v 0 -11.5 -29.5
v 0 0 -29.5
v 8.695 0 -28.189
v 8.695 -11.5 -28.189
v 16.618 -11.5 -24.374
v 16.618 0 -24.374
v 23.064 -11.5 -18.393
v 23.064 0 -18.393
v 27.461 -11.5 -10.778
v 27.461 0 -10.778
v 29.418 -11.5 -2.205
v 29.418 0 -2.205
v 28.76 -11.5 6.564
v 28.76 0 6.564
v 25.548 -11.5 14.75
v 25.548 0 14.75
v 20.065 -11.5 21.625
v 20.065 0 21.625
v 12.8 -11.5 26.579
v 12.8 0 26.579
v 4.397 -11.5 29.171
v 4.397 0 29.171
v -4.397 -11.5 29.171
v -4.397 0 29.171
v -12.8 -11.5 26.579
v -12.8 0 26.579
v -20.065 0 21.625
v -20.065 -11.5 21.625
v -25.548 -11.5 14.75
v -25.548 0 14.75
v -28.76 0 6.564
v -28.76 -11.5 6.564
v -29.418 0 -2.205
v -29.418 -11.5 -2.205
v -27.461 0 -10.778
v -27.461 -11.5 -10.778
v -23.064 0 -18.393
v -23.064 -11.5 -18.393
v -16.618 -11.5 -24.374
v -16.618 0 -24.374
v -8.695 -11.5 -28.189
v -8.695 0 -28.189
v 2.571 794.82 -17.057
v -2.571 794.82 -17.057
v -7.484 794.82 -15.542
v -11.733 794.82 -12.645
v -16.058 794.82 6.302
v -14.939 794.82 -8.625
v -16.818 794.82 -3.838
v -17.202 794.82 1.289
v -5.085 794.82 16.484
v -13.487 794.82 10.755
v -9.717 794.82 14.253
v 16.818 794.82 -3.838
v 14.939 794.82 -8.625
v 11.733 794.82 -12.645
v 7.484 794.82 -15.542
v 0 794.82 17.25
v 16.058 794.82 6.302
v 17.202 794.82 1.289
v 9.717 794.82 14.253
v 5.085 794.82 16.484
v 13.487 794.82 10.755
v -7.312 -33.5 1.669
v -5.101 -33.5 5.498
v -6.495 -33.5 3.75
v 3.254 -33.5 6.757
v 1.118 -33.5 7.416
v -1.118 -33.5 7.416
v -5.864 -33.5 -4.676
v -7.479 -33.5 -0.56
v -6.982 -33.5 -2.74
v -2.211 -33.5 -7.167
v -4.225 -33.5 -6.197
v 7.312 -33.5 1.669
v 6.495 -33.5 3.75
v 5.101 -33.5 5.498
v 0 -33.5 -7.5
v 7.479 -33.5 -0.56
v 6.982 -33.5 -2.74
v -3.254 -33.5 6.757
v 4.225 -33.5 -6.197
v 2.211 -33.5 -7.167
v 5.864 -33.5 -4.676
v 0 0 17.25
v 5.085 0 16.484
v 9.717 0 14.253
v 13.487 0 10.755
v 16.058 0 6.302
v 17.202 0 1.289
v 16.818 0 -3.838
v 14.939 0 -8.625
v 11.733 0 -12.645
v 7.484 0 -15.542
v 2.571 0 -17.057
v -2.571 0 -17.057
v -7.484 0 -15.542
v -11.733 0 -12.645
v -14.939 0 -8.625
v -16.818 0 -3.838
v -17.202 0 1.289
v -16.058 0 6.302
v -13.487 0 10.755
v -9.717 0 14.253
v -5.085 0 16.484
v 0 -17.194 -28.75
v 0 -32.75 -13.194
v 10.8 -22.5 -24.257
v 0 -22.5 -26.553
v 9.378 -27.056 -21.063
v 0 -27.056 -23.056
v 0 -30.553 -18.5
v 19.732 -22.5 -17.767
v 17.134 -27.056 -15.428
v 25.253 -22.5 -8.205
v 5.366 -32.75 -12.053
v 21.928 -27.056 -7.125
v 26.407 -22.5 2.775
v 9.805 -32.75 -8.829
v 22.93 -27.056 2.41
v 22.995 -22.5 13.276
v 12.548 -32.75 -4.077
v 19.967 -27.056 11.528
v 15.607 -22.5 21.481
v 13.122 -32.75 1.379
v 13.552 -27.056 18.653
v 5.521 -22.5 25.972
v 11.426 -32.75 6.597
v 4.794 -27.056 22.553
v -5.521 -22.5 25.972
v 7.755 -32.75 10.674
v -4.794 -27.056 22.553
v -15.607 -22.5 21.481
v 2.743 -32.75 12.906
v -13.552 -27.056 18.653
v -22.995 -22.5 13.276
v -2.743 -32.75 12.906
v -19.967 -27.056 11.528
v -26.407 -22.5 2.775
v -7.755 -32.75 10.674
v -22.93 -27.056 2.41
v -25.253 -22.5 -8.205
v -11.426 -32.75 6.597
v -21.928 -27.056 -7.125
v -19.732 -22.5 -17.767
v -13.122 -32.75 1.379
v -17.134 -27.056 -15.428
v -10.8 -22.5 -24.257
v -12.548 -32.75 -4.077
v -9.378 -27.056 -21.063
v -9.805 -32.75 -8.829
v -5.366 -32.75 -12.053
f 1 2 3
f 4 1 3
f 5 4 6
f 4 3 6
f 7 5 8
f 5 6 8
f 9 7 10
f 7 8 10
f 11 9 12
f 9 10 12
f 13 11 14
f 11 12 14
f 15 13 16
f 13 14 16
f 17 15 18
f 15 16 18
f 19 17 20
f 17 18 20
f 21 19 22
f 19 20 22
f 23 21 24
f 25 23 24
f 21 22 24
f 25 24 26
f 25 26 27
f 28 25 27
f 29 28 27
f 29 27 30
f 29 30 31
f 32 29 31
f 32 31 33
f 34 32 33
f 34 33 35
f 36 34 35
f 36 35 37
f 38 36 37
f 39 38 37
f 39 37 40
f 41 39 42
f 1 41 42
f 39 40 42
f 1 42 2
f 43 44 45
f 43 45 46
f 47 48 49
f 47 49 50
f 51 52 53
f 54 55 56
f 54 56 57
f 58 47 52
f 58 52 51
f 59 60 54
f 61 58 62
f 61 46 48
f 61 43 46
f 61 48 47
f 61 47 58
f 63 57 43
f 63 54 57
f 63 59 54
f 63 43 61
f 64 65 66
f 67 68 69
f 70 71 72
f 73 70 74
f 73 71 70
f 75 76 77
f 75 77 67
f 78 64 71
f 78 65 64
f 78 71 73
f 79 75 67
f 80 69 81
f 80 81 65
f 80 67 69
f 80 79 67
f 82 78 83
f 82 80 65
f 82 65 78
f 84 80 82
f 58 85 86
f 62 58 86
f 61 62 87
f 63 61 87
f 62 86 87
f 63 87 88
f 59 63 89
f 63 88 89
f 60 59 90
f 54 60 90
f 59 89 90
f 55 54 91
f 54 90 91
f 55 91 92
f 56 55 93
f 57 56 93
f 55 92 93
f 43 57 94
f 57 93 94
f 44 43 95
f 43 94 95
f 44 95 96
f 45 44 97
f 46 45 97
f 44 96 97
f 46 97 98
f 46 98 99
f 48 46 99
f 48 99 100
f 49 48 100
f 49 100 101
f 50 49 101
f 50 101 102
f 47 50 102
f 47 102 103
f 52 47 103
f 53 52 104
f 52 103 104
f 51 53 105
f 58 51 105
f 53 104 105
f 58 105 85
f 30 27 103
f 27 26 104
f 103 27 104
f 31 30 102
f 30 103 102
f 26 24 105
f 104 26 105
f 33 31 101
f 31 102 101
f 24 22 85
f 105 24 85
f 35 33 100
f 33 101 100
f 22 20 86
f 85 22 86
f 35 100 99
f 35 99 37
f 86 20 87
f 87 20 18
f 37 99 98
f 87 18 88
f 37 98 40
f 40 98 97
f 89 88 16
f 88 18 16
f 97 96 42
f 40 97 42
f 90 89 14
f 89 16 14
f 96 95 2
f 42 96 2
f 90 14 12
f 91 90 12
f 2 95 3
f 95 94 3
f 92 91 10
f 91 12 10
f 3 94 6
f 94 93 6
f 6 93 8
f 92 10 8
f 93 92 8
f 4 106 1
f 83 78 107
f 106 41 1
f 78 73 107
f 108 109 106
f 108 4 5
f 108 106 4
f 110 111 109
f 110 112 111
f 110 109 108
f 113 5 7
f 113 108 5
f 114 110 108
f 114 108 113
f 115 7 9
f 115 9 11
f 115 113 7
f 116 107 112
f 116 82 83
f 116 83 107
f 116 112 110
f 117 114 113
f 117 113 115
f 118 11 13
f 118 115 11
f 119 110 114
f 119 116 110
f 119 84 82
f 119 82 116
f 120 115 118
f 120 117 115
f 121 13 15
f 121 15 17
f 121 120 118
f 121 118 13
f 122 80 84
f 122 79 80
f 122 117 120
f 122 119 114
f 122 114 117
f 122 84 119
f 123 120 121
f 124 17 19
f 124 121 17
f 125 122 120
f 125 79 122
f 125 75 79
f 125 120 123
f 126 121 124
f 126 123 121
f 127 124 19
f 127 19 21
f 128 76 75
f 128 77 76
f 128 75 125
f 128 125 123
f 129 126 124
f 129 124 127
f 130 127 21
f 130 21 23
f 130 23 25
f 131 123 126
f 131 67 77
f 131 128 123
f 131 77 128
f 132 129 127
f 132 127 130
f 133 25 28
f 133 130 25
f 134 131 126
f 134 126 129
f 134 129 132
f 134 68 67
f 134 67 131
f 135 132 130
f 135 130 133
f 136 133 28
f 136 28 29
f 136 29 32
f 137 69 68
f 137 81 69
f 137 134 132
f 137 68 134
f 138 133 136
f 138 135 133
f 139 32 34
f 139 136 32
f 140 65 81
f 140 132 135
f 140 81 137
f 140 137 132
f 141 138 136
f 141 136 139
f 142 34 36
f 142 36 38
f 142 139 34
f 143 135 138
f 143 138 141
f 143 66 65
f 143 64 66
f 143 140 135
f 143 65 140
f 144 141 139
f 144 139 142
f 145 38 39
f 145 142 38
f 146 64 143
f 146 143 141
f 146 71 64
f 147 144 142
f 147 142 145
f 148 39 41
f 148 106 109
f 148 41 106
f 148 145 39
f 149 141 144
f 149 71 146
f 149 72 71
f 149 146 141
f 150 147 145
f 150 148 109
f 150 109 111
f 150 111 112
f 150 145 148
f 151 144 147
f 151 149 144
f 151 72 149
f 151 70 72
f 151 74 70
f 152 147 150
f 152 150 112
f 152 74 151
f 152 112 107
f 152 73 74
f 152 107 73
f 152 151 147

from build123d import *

# Parameters (mm, degrees)
CROQUIS2_R              = 17.25
SALIENTE_EXTRUIR1_DEPTH = 794.82
CROQUIS4_R              = 29.5
SALIENTE_EXTRUIR2_DEPTH = 33.5
REDONDEO2_R             = 22


with BuildPart() as part:
    # Croquis2 → Saliente-Extruir1 (new body)
    with BuildSketch(Plane(origin=(0, 0, 0), x_dir=(1, 0, 0), z_dir=(0, 1, 0))):
        with Locations(Location((0, 0, 0), (0, 0, 270))):
            Circle(CROQUIS2_R)
    extrude(amount=SALIENTE_EXTRUIR1_DEPTH)

    # Croquis4 → Saliente-Extruir2 (add)
    with BuildSketch(Plane.XZ):
        with Locations(Location((0, 0, 0), (0, 0, 270))):
            Circle(CROQUIS4_R)
    extrude(amount=SALIENTE_EXTRUIR2_DEPTH)

    # Redondeo2
    redondeo2_edges = [part.edges().sort_by_distance(p)[0] for p in [
        (0, -33.5, 29.5),
    ]]
    fillet(redondeo2_edges, radius=REDONDEO2_R)


solid = part.part
